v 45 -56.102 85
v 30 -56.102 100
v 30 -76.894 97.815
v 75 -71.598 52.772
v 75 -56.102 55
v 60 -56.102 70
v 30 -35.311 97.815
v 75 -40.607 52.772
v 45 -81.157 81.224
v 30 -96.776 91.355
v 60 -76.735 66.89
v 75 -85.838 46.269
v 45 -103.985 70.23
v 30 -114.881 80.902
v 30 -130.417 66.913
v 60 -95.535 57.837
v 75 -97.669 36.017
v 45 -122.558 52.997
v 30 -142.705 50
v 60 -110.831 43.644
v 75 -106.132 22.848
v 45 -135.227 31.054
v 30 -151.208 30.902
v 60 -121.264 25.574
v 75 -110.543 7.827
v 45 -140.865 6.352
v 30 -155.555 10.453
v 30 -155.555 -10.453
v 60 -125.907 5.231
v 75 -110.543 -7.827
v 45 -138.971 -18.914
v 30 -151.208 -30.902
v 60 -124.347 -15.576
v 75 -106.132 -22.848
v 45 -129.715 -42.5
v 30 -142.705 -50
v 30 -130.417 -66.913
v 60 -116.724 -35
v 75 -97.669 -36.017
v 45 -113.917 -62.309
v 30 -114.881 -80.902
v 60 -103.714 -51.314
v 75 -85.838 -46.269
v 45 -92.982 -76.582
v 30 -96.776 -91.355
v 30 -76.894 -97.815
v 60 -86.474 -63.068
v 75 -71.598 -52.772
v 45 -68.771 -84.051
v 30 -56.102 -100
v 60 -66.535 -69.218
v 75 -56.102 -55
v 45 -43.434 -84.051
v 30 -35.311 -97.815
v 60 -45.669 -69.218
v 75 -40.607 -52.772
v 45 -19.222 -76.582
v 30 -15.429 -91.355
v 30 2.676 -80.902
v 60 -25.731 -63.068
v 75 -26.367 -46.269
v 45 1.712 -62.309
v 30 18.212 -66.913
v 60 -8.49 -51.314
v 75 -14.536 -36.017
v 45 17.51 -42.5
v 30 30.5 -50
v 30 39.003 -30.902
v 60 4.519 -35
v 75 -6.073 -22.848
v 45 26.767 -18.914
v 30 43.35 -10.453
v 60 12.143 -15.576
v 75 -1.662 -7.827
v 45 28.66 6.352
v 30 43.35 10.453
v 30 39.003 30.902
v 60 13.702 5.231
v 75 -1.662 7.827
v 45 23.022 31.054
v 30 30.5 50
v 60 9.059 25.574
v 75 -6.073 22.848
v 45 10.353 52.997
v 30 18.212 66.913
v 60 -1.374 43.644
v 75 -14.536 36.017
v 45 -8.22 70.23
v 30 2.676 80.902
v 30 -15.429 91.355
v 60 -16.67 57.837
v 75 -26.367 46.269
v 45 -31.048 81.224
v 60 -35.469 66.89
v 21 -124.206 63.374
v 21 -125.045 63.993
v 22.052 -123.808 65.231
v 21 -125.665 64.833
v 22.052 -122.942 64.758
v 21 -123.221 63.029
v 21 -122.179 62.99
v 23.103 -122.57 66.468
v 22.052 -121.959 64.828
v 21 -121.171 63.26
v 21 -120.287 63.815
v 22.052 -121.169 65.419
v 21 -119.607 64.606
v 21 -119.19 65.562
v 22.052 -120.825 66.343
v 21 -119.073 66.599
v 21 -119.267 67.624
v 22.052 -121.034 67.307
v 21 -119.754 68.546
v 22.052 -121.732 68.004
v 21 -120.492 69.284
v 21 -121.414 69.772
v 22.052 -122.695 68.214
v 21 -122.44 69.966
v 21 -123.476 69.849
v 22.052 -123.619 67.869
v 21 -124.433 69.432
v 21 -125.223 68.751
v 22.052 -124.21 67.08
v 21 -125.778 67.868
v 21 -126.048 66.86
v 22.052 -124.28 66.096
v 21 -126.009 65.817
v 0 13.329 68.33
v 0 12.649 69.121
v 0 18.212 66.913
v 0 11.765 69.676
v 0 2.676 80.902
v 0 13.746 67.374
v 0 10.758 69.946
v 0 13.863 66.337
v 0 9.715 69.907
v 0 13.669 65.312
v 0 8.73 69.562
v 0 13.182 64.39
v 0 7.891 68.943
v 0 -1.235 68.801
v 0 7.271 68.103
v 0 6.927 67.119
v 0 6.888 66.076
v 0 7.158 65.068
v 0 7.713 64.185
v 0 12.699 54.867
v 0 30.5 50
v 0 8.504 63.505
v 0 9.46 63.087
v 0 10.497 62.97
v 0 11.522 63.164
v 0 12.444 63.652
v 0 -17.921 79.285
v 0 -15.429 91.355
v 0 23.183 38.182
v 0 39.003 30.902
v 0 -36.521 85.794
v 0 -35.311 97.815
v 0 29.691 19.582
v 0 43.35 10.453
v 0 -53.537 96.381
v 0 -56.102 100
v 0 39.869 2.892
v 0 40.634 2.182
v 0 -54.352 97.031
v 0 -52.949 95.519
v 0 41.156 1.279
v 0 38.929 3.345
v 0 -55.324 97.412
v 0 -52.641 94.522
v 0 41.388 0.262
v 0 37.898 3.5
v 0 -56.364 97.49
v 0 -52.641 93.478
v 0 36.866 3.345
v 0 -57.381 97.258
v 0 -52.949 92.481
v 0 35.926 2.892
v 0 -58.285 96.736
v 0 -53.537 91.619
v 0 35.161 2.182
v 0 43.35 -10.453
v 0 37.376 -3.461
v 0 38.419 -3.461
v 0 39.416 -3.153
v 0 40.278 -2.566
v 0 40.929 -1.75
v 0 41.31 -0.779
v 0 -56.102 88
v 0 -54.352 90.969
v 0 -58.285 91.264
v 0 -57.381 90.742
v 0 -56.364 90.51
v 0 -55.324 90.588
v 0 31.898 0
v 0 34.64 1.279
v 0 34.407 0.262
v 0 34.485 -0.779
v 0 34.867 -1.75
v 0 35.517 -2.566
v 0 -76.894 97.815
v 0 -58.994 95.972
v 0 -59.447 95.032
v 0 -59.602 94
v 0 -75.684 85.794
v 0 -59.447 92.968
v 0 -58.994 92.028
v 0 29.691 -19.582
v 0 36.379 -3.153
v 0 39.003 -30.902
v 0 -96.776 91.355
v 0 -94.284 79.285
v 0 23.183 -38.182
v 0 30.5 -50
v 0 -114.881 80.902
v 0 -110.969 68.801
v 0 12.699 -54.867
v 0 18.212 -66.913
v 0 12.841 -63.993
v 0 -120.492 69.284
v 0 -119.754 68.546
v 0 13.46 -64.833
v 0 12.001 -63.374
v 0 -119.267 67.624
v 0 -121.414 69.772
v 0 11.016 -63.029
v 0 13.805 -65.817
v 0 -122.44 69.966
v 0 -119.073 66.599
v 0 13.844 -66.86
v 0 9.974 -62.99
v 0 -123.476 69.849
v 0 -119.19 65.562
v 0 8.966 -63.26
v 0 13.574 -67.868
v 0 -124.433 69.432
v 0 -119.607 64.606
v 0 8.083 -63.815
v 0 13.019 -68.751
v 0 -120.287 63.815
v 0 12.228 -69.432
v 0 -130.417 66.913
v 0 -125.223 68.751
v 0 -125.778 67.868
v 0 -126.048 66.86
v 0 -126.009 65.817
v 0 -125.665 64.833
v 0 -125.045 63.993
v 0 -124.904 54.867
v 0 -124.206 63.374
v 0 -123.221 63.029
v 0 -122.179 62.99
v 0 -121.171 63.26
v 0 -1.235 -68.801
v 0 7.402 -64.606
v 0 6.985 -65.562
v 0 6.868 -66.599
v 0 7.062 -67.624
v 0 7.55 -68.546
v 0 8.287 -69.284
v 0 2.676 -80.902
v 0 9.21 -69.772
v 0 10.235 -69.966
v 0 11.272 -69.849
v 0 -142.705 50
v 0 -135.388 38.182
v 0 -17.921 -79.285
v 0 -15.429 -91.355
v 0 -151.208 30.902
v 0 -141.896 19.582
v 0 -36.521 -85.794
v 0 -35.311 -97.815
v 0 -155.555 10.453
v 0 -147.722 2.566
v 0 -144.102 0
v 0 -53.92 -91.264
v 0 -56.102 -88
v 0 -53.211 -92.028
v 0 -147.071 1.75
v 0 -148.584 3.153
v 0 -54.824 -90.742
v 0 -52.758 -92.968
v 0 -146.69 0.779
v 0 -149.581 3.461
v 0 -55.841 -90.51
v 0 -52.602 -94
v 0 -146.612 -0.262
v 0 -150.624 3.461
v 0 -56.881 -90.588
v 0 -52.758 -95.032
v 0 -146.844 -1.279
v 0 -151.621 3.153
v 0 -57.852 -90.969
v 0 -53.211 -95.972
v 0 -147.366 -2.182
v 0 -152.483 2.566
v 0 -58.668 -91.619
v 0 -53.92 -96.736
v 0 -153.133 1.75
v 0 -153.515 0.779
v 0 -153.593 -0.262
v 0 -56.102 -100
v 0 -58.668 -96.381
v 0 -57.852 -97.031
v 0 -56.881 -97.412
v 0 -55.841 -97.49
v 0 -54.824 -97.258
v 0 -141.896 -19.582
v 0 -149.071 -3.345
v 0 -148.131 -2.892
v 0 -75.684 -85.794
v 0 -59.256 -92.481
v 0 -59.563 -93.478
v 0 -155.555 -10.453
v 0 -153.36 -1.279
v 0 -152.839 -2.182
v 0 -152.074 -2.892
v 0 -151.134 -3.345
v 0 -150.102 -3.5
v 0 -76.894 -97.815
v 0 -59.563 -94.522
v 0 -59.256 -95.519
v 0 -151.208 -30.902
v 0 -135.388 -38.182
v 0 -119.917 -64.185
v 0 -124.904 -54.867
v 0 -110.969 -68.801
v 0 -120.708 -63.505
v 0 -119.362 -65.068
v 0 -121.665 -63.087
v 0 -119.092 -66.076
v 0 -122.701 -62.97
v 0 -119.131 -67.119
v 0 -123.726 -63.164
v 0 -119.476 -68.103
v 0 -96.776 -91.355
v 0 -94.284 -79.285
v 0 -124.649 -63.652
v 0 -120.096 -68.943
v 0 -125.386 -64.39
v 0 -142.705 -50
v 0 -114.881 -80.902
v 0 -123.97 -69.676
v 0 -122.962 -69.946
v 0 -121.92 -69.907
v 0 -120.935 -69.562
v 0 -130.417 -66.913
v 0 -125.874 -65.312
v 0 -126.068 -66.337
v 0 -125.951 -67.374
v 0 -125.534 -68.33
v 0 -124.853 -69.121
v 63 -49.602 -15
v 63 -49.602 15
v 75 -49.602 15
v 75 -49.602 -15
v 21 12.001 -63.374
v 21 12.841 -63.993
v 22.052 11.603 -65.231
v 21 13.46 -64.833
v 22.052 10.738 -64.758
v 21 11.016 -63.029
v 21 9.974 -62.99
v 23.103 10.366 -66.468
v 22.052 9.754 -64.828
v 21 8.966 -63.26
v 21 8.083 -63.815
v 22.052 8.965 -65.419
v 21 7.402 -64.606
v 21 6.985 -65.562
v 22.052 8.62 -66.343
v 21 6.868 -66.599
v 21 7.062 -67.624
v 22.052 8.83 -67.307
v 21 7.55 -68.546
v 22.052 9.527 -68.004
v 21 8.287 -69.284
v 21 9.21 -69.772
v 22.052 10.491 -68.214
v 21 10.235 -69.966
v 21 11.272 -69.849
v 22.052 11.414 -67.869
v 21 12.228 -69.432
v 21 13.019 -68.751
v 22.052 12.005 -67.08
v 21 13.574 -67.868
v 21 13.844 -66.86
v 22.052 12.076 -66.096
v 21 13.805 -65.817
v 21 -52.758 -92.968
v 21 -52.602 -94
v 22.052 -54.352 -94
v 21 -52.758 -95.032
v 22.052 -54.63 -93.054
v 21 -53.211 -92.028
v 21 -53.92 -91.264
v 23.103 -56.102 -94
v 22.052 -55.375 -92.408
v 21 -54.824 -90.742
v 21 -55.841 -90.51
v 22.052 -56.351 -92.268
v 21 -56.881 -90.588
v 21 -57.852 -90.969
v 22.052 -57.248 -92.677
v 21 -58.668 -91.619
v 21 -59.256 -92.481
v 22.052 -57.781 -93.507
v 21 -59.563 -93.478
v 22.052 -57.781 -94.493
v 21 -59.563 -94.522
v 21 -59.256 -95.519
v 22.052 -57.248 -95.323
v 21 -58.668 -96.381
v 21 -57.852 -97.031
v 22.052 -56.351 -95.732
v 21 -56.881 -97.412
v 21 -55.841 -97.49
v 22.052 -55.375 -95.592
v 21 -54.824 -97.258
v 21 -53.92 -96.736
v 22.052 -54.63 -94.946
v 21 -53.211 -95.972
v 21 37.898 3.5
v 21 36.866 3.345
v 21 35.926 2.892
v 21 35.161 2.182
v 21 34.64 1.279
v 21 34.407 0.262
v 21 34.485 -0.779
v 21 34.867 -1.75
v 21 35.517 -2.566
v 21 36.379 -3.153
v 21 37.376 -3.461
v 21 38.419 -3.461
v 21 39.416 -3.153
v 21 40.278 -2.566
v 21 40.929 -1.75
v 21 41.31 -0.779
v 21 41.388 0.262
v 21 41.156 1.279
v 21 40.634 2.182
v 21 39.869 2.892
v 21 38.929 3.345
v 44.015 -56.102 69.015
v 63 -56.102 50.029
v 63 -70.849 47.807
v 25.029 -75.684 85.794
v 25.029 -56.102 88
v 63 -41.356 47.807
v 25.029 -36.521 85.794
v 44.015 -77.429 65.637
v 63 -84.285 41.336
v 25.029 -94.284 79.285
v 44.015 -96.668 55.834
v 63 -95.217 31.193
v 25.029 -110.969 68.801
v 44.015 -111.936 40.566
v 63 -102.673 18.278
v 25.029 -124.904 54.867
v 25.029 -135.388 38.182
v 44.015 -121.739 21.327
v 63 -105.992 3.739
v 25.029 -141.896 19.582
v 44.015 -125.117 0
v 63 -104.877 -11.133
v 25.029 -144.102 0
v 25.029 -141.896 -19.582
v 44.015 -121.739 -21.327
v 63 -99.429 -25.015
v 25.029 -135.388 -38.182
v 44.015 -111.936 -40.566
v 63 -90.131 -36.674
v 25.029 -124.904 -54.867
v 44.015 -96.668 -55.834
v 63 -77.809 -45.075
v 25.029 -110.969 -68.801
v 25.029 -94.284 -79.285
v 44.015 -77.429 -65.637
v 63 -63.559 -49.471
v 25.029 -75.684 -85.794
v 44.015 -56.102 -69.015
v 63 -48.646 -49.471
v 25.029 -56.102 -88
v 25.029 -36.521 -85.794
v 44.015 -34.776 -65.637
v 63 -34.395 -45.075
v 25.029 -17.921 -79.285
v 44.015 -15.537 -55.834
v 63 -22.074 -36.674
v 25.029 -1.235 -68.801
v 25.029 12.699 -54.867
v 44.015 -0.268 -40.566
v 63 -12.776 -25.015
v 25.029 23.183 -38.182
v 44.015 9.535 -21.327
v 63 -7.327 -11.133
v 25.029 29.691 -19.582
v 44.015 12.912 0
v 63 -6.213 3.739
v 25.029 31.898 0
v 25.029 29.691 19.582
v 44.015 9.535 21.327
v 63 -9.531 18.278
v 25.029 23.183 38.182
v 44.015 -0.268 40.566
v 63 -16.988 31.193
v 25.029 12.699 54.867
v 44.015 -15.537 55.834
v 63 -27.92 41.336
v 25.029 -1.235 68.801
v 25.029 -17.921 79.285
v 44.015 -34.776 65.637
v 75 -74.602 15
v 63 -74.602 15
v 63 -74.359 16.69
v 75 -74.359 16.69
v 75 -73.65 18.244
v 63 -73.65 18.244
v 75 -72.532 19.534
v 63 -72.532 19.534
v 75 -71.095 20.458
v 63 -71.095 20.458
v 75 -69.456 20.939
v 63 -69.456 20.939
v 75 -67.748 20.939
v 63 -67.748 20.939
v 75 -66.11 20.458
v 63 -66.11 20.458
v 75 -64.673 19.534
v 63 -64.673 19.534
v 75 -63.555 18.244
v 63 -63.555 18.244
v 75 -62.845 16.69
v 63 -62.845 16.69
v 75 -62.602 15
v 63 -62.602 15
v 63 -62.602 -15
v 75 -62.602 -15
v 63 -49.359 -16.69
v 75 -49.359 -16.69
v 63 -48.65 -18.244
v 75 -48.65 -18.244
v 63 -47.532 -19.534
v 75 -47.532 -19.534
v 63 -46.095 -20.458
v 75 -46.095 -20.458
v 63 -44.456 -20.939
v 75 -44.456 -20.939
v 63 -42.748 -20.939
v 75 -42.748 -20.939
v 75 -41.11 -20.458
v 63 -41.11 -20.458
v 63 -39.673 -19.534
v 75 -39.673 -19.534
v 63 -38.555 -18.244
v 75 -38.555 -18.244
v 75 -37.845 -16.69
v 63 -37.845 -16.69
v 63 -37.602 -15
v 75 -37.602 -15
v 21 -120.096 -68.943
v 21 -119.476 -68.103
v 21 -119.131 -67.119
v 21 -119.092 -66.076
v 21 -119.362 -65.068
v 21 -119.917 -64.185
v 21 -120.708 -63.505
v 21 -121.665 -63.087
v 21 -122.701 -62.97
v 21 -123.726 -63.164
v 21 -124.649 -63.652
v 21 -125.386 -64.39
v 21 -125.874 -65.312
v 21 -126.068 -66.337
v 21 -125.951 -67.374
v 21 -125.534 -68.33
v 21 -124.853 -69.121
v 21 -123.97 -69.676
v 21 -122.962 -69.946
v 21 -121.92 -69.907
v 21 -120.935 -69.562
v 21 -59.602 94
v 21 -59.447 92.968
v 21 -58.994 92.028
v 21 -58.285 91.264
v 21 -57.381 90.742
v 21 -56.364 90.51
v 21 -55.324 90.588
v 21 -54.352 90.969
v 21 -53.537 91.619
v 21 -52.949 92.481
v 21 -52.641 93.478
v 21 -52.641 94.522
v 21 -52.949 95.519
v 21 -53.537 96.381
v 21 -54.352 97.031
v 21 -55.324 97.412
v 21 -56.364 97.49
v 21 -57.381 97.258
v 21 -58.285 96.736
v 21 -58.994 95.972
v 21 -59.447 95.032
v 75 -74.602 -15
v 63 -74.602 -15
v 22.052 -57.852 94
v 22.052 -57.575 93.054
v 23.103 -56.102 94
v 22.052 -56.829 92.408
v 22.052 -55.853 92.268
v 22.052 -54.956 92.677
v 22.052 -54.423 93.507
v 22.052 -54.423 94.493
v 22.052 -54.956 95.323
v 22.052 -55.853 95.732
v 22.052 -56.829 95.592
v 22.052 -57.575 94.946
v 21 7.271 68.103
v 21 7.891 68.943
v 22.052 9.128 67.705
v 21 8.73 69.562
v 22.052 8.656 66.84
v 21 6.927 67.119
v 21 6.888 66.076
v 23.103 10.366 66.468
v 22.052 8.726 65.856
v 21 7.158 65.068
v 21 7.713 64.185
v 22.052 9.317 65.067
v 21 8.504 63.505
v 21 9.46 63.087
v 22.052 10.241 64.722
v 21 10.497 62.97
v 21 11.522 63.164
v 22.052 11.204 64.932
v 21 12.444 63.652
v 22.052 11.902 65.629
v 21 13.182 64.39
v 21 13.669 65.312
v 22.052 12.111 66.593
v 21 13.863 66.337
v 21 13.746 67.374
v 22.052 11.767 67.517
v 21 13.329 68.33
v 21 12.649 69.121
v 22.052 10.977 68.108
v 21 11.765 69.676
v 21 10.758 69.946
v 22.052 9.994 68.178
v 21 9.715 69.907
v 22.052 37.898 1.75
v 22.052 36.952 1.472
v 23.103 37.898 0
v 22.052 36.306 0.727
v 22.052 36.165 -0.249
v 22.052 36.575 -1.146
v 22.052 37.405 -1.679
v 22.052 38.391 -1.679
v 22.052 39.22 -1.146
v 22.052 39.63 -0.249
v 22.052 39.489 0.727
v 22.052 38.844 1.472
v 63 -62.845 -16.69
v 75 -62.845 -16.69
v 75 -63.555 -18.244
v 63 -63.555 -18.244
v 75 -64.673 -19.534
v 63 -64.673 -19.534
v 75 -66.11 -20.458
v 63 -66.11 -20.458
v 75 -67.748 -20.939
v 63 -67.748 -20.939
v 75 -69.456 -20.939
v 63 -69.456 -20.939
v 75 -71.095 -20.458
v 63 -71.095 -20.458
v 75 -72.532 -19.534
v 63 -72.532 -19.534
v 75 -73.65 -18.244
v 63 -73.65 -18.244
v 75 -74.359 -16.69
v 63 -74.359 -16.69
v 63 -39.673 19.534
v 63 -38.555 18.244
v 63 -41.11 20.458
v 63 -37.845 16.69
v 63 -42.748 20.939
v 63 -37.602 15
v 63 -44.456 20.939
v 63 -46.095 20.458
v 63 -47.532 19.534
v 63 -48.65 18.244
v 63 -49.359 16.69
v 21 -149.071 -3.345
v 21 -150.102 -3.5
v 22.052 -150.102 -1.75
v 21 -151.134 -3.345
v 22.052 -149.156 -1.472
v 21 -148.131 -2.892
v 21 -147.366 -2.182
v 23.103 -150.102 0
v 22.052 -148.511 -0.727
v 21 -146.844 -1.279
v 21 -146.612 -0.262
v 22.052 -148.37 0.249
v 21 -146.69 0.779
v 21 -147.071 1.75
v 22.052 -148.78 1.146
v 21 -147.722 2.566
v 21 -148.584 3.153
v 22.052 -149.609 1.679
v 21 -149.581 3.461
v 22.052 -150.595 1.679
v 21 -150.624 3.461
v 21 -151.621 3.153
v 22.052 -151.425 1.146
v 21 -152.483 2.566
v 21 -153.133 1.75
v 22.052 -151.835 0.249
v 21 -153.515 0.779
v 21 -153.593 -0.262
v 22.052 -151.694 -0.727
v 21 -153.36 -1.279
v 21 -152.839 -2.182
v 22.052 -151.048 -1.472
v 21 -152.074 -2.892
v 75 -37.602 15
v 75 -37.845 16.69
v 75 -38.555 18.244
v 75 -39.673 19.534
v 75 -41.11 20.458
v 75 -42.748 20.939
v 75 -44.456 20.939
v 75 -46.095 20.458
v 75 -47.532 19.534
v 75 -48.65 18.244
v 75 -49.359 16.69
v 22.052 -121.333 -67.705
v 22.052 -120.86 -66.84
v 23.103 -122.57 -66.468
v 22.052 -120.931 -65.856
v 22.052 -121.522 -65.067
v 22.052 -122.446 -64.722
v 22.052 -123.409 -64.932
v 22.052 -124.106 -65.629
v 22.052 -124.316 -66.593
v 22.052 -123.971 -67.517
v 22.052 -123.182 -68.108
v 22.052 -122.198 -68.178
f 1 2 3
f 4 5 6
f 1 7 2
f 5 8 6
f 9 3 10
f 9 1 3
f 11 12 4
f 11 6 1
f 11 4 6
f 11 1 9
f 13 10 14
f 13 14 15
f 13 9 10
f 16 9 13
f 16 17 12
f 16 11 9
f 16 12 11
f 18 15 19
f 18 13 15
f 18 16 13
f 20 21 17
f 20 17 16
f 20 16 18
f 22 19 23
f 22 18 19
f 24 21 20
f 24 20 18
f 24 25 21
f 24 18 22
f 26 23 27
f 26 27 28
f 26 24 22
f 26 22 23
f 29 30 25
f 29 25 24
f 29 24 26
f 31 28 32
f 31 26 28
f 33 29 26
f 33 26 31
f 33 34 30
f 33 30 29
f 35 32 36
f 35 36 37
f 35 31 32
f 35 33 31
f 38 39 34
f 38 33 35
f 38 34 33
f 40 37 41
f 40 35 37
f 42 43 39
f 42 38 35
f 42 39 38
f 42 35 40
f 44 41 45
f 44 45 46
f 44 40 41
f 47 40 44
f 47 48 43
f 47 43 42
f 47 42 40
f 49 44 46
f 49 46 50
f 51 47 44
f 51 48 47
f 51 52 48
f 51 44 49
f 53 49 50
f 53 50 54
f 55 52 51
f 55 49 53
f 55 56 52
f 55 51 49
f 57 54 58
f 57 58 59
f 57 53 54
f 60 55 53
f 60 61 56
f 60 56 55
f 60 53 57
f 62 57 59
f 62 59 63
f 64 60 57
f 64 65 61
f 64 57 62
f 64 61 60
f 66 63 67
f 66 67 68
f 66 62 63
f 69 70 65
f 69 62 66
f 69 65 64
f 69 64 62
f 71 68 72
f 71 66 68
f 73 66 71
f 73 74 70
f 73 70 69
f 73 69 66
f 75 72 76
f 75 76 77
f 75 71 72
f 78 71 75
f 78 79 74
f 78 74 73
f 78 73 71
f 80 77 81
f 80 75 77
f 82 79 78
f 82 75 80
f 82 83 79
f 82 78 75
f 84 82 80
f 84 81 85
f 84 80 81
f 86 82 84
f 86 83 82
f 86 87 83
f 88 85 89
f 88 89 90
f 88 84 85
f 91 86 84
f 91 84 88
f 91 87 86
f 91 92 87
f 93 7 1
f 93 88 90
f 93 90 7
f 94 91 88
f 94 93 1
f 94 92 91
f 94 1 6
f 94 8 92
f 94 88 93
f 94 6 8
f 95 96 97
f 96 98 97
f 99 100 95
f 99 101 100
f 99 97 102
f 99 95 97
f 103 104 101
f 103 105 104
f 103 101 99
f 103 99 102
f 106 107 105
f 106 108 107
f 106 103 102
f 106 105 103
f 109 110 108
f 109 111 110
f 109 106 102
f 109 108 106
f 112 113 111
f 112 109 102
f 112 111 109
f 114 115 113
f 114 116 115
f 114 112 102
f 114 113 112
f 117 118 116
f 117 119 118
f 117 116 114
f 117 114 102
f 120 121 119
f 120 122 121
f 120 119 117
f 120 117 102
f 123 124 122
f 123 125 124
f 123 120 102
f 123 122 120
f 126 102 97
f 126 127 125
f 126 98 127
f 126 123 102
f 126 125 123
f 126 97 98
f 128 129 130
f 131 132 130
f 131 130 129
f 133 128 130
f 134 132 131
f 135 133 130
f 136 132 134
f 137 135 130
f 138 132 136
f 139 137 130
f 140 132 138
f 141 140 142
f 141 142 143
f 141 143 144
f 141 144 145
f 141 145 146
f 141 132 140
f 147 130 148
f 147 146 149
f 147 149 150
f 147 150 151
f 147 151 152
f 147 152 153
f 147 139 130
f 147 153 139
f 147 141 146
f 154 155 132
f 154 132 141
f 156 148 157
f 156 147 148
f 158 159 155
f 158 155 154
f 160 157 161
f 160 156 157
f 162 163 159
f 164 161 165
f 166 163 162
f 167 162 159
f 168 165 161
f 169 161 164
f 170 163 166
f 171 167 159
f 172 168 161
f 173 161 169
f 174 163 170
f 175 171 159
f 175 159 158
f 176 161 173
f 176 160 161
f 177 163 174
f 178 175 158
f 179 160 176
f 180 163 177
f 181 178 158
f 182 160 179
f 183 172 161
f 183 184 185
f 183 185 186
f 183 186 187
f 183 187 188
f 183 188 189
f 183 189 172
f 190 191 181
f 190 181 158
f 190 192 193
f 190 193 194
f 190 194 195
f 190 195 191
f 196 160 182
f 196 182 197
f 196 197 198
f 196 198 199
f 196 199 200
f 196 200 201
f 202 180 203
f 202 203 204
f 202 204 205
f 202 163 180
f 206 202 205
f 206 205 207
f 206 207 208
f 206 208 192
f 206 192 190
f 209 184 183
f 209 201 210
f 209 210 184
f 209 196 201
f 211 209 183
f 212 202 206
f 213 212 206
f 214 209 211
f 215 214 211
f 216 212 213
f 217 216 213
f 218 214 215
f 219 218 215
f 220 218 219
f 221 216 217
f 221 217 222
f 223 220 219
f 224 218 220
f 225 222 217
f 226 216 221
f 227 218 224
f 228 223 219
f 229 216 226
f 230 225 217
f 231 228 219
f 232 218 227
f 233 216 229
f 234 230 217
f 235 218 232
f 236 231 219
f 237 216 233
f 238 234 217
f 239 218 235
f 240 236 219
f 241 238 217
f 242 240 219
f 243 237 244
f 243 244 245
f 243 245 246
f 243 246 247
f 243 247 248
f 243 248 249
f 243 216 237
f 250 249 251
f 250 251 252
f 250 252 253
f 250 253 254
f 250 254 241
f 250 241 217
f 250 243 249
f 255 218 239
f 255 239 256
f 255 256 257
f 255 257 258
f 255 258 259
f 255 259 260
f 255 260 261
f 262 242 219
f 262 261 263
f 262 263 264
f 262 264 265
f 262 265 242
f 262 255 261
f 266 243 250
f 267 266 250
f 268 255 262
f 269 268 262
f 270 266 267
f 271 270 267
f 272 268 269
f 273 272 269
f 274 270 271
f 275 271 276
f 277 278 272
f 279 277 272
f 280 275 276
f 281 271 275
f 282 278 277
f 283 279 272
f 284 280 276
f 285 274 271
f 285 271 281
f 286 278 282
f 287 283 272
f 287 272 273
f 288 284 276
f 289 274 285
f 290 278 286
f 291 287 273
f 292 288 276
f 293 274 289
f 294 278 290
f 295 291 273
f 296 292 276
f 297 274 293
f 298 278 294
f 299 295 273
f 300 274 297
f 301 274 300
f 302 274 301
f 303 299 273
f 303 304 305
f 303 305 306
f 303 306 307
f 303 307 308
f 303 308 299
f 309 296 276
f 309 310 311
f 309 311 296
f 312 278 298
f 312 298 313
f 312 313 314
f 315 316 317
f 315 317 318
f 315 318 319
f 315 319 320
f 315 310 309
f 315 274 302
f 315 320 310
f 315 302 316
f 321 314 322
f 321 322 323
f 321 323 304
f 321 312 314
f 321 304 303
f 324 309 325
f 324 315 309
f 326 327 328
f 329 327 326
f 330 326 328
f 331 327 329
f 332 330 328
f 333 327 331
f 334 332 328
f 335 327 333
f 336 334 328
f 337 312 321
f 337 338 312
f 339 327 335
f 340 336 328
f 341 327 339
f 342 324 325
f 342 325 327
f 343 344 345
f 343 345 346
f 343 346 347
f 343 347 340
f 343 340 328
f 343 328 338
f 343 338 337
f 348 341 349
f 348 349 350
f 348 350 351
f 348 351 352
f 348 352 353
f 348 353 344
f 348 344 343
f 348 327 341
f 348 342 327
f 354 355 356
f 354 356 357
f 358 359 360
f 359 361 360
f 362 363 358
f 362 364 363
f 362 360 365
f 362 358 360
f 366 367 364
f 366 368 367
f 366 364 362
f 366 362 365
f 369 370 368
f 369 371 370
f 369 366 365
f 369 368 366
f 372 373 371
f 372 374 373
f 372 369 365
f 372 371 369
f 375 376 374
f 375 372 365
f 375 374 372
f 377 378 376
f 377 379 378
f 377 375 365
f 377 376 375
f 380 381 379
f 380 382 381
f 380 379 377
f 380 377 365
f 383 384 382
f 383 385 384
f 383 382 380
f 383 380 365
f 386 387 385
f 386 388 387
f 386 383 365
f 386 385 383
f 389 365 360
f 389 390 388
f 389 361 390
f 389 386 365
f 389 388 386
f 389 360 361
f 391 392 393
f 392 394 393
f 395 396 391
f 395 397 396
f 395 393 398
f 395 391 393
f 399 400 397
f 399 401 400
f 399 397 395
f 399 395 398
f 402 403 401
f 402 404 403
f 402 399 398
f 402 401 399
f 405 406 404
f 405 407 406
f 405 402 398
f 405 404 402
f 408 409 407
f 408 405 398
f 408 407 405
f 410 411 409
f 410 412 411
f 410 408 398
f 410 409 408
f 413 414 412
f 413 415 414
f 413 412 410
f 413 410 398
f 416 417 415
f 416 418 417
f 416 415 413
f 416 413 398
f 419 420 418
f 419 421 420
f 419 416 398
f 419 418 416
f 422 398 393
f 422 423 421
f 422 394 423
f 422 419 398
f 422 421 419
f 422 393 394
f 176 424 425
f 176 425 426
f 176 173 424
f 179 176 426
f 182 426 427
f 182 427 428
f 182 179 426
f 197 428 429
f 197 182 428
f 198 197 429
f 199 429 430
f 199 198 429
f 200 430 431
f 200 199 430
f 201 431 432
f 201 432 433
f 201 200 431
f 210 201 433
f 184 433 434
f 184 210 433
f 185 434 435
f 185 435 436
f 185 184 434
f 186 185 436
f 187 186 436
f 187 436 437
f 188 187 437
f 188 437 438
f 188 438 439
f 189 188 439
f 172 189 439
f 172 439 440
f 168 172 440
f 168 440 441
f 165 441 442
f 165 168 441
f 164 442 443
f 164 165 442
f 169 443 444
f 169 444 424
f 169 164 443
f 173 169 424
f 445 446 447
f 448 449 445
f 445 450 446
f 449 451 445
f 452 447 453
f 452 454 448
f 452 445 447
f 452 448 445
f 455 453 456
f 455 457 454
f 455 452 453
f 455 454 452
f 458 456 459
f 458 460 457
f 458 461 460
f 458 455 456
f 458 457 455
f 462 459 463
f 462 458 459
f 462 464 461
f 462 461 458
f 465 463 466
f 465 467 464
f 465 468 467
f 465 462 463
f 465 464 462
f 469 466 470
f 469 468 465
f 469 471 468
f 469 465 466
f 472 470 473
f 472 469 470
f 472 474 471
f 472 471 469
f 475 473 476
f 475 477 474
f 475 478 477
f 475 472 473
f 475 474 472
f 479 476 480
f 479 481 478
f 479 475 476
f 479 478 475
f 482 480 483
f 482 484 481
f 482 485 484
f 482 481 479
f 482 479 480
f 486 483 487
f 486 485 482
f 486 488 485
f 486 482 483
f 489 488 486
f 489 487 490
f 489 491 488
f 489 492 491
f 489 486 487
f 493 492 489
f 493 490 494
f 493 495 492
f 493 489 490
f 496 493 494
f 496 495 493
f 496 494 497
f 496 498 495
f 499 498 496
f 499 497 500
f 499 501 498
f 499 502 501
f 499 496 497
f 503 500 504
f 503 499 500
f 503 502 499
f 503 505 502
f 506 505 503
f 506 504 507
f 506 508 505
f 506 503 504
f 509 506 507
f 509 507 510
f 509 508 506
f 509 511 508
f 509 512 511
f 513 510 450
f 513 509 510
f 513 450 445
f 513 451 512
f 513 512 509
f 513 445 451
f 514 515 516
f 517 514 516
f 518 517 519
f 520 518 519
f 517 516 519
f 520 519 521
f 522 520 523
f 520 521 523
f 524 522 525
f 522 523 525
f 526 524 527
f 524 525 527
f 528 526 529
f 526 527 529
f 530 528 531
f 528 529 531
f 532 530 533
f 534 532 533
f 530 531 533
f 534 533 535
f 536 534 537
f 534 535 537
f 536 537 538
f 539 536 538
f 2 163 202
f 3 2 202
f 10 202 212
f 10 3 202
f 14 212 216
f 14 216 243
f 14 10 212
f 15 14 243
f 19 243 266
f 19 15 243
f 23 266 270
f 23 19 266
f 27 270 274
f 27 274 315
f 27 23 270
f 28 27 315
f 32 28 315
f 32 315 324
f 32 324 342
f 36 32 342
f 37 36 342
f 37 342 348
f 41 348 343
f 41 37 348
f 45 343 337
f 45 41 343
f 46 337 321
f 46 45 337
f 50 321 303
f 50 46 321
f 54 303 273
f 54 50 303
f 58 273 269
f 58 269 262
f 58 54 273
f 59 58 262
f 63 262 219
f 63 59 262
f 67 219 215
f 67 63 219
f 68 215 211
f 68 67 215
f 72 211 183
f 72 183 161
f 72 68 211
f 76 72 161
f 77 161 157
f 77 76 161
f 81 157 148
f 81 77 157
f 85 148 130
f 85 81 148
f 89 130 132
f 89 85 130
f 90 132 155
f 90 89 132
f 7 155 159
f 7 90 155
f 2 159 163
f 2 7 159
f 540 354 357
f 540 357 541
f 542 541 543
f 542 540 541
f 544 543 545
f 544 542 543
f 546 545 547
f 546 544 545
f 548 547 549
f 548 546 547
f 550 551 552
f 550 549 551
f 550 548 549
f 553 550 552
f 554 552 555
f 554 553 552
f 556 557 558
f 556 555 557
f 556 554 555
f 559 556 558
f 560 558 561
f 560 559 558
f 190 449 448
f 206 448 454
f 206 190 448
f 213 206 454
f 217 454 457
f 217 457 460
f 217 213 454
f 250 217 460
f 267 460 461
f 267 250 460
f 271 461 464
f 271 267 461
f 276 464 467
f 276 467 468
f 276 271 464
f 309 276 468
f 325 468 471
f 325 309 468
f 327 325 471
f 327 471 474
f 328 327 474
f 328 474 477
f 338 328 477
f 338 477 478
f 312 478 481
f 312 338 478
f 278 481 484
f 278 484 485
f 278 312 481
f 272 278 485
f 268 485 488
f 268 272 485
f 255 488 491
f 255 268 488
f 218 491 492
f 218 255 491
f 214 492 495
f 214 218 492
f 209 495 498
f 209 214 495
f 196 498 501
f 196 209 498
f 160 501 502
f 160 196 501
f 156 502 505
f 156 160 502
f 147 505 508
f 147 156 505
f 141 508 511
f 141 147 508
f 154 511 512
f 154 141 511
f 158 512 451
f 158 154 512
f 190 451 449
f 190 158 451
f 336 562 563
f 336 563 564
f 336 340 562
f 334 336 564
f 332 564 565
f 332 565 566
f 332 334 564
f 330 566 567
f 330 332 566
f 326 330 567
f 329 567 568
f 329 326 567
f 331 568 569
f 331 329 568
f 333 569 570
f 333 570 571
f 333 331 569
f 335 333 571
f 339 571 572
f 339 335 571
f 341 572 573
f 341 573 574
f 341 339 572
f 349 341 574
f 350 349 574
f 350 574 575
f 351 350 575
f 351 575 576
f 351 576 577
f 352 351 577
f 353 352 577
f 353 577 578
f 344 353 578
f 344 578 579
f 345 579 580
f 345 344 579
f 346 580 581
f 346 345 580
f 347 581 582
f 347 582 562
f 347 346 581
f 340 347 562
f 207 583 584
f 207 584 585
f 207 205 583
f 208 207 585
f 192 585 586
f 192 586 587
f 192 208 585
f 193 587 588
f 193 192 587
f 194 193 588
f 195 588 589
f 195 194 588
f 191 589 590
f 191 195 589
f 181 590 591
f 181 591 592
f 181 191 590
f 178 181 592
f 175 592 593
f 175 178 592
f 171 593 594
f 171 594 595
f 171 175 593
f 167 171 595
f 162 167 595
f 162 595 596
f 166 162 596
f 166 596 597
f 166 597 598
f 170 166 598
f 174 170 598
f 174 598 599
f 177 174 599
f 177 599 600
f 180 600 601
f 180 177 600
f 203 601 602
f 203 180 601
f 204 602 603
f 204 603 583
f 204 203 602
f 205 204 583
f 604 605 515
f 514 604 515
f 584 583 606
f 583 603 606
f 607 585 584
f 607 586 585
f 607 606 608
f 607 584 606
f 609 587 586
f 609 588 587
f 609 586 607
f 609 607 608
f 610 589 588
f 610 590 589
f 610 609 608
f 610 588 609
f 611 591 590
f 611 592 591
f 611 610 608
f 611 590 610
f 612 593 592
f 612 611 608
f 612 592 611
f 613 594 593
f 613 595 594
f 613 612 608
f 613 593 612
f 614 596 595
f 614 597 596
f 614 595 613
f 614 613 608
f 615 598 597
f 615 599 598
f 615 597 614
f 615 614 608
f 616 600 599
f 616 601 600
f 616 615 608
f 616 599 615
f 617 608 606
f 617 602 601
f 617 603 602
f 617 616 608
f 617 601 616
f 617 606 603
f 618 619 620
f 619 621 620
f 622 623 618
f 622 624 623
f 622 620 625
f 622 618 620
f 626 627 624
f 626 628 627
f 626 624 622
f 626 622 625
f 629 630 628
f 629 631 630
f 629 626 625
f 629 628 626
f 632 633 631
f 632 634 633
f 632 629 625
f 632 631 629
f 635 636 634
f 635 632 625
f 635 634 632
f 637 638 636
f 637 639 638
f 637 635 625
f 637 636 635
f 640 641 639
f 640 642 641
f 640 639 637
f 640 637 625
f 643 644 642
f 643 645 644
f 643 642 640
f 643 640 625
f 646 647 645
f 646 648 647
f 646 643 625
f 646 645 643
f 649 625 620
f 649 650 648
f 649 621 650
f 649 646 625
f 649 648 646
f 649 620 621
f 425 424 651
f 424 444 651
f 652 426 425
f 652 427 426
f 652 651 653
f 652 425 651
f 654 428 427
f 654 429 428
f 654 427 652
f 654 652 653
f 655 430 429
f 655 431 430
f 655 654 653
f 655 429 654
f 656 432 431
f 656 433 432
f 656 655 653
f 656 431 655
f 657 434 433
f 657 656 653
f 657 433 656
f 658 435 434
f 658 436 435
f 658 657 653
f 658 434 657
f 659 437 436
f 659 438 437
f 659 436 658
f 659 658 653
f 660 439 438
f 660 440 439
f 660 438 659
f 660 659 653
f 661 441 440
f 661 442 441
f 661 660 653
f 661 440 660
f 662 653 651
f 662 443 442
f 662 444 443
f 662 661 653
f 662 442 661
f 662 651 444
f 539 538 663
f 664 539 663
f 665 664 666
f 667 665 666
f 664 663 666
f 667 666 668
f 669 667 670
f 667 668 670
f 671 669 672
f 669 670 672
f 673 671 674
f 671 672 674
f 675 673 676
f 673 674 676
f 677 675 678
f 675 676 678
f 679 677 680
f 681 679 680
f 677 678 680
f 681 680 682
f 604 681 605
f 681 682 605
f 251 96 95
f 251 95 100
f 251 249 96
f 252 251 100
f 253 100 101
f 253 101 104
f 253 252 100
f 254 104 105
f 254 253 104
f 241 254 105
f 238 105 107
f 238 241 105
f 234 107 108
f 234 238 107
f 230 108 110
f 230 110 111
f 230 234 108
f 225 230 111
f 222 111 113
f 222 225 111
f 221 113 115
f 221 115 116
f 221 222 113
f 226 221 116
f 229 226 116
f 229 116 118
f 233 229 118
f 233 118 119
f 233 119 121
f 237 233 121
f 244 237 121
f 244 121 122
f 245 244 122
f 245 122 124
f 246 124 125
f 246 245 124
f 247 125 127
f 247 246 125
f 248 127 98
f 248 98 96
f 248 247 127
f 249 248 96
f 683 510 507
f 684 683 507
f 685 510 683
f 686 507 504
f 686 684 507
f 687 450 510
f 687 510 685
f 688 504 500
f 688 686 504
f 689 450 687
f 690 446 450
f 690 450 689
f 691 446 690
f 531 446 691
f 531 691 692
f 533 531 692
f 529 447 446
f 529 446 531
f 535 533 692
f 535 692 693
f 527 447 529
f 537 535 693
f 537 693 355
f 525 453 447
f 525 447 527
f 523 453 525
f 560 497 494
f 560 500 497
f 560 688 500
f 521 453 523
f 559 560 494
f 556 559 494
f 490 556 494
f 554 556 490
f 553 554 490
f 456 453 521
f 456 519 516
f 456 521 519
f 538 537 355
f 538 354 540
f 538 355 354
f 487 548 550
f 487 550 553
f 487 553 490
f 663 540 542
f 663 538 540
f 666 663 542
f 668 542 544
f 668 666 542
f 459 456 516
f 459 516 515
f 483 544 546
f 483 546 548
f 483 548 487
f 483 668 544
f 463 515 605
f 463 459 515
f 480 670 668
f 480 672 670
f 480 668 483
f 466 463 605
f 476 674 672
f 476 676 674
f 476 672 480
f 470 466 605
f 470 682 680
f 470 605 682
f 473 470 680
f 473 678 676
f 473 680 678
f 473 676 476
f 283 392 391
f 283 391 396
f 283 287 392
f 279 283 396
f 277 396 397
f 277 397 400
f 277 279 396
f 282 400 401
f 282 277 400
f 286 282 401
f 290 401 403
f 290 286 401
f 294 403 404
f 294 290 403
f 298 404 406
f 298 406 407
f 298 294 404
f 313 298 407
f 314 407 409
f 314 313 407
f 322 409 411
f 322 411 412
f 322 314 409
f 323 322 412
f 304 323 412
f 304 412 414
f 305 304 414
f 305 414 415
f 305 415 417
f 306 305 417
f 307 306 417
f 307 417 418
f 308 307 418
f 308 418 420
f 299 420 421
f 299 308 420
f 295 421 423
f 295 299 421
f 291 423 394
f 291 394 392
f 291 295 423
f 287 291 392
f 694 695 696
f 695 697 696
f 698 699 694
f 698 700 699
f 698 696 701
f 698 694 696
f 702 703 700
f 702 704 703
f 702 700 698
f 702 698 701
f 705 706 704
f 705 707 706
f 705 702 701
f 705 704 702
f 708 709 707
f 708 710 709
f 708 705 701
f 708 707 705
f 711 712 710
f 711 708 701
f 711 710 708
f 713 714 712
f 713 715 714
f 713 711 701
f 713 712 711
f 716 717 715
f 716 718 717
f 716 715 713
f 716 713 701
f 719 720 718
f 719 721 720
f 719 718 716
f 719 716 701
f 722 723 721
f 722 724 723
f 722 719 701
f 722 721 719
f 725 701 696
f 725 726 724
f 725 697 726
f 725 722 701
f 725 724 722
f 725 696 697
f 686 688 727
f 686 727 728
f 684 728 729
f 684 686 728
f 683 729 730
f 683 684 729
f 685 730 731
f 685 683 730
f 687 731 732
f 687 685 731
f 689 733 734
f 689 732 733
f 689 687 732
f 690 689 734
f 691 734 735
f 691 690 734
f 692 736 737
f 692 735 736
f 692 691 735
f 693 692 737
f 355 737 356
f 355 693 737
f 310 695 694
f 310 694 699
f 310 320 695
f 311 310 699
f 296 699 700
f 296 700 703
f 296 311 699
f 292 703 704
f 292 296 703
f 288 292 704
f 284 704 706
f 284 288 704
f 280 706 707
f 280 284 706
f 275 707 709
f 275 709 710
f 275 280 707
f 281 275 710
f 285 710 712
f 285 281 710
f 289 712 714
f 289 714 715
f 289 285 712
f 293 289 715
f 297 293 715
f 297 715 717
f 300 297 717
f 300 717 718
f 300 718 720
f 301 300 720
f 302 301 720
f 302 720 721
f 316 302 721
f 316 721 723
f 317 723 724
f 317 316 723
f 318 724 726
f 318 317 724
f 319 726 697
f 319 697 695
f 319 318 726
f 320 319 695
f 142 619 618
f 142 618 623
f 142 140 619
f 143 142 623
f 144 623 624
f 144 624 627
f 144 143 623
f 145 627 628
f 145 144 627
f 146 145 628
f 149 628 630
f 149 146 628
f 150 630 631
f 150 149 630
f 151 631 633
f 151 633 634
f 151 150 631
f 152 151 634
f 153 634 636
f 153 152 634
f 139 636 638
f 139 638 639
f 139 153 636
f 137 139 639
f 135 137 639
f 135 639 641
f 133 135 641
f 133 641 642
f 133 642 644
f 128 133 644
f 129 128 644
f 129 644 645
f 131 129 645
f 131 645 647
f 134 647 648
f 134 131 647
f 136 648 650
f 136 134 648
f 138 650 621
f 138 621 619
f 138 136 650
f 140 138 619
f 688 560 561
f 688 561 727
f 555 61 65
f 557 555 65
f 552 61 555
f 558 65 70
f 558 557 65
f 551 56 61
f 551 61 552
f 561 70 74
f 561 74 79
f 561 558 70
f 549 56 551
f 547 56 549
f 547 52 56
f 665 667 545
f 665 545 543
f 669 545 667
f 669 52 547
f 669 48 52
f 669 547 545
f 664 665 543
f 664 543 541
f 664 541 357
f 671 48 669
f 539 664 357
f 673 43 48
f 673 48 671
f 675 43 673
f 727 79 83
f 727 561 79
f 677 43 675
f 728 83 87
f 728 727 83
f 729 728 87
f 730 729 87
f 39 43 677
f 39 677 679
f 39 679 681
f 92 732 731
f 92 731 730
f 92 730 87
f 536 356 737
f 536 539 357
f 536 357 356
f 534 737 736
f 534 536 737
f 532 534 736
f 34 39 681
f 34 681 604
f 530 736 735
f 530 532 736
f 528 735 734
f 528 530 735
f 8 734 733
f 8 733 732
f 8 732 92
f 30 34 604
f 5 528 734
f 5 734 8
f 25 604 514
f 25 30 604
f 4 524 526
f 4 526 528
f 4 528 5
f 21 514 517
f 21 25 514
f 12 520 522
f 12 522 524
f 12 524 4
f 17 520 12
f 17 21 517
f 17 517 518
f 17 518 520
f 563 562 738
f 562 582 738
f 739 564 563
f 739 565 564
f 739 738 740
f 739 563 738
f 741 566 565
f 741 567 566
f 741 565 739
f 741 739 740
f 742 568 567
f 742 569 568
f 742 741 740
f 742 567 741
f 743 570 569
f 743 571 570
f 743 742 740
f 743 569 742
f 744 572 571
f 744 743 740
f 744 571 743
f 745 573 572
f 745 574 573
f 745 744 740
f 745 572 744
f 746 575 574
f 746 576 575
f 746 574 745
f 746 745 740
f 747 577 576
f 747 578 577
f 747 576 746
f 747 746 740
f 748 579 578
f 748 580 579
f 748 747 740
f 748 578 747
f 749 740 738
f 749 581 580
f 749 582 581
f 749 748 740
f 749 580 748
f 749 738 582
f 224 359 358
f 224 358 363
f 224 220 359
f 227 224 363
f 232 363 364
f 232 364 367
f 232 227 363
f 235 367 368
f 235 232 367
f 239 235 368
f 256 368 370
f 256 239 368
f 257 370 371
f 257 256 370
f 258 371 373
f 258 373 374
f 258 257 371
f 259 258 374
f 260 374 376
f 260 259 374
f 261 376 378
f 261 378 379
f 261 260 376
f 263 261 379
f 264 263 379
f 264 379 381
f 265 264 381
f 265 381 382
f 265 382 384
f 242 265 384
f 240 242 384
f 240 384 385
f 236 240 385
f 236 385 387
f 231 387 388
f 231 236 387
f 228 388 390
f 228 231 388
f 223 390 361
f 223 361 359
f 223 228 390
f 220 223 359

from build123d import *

# Parameters (mm, degrees)
CIRPATTERN_COUNT = 8
SLOT_CUT_DEPTH   = 196.79823157


with BuildPart() as part:
    # Sketch1 → Revolve 2 (revolve)
    with BuildSketch(Plane.XY, mode=Mode.PRIVATE) as revolve_2_sk:
        Polygon((0, 43.897637795), (30, 43.897637795), (75, -1.102362205), (75, -56.102362205), (63, -56.102362205), (63, -6.072924953), (25.029437252, 31.897637795), (0, 31.897637795), align=None)
    revolve(revolve_2_sk.sketch.rotate(Axis((63, -56.102362205, 0), (1, 0, 0)), 90), axis=Axis((63, -56.102362205, 0), (1, 0, 0)))

    # Sketch3 → M8x1.0 Tapped Hole (revolve, cut)
    with BuildSketch(Plane.ZX.offset(37.897637795)):
        Polygon((0, 0), (0, 23.103012167), (3.5, 21), (3.5, 0), align=None)
    m8x1_0_tapped_hole = revolve(axis=Axis((-6.35, 37.897637795, 0), (1, 0, 0)), mode=Mode.SUBTRACT)

    # CirPattern: M8x1.0 Tapped Hole ×8 about axis
    cirpattern_axis = Axis((0, -56.102362205, 0), (1, 0, 0))
    for i in range(1, CIRPATTERN_COUNT):
        add(m8x1_0_tapped_hole.rotate(cirpattern_axis, i * 360 / CIRPATTERN_COUNT), mode=Mode.SUBTRACT)

    # Sketch2 → Slot Cut (cut, through all)
    with BuildSketch(Plane.ZY.offset(-63)):
        with BuildLine():
            Line((-15, -37.602362205), (15, -37.602362205))
            ThreePointArc((15, -37.602362205), (21, -43.602362205), (15, -49.602362205))
            Line((15, -49.602362205), (-15, -49.602362205))
            ThreePointArc((-15, -49.602362205), (-21, -43.602362205), (-15, -37.602362205))
        make_face()
    slot_cut = extrude(amount=-SLOT_CUT_DEPTH, mode=Mode.SUBTRACT)

    # Mirror 2: Slot Cut across plane
    add(slot_cut.mirror(Plane.ZX.offset(-56.102362205)), mode=Mode.SUBTRACT)


solid = part.part
